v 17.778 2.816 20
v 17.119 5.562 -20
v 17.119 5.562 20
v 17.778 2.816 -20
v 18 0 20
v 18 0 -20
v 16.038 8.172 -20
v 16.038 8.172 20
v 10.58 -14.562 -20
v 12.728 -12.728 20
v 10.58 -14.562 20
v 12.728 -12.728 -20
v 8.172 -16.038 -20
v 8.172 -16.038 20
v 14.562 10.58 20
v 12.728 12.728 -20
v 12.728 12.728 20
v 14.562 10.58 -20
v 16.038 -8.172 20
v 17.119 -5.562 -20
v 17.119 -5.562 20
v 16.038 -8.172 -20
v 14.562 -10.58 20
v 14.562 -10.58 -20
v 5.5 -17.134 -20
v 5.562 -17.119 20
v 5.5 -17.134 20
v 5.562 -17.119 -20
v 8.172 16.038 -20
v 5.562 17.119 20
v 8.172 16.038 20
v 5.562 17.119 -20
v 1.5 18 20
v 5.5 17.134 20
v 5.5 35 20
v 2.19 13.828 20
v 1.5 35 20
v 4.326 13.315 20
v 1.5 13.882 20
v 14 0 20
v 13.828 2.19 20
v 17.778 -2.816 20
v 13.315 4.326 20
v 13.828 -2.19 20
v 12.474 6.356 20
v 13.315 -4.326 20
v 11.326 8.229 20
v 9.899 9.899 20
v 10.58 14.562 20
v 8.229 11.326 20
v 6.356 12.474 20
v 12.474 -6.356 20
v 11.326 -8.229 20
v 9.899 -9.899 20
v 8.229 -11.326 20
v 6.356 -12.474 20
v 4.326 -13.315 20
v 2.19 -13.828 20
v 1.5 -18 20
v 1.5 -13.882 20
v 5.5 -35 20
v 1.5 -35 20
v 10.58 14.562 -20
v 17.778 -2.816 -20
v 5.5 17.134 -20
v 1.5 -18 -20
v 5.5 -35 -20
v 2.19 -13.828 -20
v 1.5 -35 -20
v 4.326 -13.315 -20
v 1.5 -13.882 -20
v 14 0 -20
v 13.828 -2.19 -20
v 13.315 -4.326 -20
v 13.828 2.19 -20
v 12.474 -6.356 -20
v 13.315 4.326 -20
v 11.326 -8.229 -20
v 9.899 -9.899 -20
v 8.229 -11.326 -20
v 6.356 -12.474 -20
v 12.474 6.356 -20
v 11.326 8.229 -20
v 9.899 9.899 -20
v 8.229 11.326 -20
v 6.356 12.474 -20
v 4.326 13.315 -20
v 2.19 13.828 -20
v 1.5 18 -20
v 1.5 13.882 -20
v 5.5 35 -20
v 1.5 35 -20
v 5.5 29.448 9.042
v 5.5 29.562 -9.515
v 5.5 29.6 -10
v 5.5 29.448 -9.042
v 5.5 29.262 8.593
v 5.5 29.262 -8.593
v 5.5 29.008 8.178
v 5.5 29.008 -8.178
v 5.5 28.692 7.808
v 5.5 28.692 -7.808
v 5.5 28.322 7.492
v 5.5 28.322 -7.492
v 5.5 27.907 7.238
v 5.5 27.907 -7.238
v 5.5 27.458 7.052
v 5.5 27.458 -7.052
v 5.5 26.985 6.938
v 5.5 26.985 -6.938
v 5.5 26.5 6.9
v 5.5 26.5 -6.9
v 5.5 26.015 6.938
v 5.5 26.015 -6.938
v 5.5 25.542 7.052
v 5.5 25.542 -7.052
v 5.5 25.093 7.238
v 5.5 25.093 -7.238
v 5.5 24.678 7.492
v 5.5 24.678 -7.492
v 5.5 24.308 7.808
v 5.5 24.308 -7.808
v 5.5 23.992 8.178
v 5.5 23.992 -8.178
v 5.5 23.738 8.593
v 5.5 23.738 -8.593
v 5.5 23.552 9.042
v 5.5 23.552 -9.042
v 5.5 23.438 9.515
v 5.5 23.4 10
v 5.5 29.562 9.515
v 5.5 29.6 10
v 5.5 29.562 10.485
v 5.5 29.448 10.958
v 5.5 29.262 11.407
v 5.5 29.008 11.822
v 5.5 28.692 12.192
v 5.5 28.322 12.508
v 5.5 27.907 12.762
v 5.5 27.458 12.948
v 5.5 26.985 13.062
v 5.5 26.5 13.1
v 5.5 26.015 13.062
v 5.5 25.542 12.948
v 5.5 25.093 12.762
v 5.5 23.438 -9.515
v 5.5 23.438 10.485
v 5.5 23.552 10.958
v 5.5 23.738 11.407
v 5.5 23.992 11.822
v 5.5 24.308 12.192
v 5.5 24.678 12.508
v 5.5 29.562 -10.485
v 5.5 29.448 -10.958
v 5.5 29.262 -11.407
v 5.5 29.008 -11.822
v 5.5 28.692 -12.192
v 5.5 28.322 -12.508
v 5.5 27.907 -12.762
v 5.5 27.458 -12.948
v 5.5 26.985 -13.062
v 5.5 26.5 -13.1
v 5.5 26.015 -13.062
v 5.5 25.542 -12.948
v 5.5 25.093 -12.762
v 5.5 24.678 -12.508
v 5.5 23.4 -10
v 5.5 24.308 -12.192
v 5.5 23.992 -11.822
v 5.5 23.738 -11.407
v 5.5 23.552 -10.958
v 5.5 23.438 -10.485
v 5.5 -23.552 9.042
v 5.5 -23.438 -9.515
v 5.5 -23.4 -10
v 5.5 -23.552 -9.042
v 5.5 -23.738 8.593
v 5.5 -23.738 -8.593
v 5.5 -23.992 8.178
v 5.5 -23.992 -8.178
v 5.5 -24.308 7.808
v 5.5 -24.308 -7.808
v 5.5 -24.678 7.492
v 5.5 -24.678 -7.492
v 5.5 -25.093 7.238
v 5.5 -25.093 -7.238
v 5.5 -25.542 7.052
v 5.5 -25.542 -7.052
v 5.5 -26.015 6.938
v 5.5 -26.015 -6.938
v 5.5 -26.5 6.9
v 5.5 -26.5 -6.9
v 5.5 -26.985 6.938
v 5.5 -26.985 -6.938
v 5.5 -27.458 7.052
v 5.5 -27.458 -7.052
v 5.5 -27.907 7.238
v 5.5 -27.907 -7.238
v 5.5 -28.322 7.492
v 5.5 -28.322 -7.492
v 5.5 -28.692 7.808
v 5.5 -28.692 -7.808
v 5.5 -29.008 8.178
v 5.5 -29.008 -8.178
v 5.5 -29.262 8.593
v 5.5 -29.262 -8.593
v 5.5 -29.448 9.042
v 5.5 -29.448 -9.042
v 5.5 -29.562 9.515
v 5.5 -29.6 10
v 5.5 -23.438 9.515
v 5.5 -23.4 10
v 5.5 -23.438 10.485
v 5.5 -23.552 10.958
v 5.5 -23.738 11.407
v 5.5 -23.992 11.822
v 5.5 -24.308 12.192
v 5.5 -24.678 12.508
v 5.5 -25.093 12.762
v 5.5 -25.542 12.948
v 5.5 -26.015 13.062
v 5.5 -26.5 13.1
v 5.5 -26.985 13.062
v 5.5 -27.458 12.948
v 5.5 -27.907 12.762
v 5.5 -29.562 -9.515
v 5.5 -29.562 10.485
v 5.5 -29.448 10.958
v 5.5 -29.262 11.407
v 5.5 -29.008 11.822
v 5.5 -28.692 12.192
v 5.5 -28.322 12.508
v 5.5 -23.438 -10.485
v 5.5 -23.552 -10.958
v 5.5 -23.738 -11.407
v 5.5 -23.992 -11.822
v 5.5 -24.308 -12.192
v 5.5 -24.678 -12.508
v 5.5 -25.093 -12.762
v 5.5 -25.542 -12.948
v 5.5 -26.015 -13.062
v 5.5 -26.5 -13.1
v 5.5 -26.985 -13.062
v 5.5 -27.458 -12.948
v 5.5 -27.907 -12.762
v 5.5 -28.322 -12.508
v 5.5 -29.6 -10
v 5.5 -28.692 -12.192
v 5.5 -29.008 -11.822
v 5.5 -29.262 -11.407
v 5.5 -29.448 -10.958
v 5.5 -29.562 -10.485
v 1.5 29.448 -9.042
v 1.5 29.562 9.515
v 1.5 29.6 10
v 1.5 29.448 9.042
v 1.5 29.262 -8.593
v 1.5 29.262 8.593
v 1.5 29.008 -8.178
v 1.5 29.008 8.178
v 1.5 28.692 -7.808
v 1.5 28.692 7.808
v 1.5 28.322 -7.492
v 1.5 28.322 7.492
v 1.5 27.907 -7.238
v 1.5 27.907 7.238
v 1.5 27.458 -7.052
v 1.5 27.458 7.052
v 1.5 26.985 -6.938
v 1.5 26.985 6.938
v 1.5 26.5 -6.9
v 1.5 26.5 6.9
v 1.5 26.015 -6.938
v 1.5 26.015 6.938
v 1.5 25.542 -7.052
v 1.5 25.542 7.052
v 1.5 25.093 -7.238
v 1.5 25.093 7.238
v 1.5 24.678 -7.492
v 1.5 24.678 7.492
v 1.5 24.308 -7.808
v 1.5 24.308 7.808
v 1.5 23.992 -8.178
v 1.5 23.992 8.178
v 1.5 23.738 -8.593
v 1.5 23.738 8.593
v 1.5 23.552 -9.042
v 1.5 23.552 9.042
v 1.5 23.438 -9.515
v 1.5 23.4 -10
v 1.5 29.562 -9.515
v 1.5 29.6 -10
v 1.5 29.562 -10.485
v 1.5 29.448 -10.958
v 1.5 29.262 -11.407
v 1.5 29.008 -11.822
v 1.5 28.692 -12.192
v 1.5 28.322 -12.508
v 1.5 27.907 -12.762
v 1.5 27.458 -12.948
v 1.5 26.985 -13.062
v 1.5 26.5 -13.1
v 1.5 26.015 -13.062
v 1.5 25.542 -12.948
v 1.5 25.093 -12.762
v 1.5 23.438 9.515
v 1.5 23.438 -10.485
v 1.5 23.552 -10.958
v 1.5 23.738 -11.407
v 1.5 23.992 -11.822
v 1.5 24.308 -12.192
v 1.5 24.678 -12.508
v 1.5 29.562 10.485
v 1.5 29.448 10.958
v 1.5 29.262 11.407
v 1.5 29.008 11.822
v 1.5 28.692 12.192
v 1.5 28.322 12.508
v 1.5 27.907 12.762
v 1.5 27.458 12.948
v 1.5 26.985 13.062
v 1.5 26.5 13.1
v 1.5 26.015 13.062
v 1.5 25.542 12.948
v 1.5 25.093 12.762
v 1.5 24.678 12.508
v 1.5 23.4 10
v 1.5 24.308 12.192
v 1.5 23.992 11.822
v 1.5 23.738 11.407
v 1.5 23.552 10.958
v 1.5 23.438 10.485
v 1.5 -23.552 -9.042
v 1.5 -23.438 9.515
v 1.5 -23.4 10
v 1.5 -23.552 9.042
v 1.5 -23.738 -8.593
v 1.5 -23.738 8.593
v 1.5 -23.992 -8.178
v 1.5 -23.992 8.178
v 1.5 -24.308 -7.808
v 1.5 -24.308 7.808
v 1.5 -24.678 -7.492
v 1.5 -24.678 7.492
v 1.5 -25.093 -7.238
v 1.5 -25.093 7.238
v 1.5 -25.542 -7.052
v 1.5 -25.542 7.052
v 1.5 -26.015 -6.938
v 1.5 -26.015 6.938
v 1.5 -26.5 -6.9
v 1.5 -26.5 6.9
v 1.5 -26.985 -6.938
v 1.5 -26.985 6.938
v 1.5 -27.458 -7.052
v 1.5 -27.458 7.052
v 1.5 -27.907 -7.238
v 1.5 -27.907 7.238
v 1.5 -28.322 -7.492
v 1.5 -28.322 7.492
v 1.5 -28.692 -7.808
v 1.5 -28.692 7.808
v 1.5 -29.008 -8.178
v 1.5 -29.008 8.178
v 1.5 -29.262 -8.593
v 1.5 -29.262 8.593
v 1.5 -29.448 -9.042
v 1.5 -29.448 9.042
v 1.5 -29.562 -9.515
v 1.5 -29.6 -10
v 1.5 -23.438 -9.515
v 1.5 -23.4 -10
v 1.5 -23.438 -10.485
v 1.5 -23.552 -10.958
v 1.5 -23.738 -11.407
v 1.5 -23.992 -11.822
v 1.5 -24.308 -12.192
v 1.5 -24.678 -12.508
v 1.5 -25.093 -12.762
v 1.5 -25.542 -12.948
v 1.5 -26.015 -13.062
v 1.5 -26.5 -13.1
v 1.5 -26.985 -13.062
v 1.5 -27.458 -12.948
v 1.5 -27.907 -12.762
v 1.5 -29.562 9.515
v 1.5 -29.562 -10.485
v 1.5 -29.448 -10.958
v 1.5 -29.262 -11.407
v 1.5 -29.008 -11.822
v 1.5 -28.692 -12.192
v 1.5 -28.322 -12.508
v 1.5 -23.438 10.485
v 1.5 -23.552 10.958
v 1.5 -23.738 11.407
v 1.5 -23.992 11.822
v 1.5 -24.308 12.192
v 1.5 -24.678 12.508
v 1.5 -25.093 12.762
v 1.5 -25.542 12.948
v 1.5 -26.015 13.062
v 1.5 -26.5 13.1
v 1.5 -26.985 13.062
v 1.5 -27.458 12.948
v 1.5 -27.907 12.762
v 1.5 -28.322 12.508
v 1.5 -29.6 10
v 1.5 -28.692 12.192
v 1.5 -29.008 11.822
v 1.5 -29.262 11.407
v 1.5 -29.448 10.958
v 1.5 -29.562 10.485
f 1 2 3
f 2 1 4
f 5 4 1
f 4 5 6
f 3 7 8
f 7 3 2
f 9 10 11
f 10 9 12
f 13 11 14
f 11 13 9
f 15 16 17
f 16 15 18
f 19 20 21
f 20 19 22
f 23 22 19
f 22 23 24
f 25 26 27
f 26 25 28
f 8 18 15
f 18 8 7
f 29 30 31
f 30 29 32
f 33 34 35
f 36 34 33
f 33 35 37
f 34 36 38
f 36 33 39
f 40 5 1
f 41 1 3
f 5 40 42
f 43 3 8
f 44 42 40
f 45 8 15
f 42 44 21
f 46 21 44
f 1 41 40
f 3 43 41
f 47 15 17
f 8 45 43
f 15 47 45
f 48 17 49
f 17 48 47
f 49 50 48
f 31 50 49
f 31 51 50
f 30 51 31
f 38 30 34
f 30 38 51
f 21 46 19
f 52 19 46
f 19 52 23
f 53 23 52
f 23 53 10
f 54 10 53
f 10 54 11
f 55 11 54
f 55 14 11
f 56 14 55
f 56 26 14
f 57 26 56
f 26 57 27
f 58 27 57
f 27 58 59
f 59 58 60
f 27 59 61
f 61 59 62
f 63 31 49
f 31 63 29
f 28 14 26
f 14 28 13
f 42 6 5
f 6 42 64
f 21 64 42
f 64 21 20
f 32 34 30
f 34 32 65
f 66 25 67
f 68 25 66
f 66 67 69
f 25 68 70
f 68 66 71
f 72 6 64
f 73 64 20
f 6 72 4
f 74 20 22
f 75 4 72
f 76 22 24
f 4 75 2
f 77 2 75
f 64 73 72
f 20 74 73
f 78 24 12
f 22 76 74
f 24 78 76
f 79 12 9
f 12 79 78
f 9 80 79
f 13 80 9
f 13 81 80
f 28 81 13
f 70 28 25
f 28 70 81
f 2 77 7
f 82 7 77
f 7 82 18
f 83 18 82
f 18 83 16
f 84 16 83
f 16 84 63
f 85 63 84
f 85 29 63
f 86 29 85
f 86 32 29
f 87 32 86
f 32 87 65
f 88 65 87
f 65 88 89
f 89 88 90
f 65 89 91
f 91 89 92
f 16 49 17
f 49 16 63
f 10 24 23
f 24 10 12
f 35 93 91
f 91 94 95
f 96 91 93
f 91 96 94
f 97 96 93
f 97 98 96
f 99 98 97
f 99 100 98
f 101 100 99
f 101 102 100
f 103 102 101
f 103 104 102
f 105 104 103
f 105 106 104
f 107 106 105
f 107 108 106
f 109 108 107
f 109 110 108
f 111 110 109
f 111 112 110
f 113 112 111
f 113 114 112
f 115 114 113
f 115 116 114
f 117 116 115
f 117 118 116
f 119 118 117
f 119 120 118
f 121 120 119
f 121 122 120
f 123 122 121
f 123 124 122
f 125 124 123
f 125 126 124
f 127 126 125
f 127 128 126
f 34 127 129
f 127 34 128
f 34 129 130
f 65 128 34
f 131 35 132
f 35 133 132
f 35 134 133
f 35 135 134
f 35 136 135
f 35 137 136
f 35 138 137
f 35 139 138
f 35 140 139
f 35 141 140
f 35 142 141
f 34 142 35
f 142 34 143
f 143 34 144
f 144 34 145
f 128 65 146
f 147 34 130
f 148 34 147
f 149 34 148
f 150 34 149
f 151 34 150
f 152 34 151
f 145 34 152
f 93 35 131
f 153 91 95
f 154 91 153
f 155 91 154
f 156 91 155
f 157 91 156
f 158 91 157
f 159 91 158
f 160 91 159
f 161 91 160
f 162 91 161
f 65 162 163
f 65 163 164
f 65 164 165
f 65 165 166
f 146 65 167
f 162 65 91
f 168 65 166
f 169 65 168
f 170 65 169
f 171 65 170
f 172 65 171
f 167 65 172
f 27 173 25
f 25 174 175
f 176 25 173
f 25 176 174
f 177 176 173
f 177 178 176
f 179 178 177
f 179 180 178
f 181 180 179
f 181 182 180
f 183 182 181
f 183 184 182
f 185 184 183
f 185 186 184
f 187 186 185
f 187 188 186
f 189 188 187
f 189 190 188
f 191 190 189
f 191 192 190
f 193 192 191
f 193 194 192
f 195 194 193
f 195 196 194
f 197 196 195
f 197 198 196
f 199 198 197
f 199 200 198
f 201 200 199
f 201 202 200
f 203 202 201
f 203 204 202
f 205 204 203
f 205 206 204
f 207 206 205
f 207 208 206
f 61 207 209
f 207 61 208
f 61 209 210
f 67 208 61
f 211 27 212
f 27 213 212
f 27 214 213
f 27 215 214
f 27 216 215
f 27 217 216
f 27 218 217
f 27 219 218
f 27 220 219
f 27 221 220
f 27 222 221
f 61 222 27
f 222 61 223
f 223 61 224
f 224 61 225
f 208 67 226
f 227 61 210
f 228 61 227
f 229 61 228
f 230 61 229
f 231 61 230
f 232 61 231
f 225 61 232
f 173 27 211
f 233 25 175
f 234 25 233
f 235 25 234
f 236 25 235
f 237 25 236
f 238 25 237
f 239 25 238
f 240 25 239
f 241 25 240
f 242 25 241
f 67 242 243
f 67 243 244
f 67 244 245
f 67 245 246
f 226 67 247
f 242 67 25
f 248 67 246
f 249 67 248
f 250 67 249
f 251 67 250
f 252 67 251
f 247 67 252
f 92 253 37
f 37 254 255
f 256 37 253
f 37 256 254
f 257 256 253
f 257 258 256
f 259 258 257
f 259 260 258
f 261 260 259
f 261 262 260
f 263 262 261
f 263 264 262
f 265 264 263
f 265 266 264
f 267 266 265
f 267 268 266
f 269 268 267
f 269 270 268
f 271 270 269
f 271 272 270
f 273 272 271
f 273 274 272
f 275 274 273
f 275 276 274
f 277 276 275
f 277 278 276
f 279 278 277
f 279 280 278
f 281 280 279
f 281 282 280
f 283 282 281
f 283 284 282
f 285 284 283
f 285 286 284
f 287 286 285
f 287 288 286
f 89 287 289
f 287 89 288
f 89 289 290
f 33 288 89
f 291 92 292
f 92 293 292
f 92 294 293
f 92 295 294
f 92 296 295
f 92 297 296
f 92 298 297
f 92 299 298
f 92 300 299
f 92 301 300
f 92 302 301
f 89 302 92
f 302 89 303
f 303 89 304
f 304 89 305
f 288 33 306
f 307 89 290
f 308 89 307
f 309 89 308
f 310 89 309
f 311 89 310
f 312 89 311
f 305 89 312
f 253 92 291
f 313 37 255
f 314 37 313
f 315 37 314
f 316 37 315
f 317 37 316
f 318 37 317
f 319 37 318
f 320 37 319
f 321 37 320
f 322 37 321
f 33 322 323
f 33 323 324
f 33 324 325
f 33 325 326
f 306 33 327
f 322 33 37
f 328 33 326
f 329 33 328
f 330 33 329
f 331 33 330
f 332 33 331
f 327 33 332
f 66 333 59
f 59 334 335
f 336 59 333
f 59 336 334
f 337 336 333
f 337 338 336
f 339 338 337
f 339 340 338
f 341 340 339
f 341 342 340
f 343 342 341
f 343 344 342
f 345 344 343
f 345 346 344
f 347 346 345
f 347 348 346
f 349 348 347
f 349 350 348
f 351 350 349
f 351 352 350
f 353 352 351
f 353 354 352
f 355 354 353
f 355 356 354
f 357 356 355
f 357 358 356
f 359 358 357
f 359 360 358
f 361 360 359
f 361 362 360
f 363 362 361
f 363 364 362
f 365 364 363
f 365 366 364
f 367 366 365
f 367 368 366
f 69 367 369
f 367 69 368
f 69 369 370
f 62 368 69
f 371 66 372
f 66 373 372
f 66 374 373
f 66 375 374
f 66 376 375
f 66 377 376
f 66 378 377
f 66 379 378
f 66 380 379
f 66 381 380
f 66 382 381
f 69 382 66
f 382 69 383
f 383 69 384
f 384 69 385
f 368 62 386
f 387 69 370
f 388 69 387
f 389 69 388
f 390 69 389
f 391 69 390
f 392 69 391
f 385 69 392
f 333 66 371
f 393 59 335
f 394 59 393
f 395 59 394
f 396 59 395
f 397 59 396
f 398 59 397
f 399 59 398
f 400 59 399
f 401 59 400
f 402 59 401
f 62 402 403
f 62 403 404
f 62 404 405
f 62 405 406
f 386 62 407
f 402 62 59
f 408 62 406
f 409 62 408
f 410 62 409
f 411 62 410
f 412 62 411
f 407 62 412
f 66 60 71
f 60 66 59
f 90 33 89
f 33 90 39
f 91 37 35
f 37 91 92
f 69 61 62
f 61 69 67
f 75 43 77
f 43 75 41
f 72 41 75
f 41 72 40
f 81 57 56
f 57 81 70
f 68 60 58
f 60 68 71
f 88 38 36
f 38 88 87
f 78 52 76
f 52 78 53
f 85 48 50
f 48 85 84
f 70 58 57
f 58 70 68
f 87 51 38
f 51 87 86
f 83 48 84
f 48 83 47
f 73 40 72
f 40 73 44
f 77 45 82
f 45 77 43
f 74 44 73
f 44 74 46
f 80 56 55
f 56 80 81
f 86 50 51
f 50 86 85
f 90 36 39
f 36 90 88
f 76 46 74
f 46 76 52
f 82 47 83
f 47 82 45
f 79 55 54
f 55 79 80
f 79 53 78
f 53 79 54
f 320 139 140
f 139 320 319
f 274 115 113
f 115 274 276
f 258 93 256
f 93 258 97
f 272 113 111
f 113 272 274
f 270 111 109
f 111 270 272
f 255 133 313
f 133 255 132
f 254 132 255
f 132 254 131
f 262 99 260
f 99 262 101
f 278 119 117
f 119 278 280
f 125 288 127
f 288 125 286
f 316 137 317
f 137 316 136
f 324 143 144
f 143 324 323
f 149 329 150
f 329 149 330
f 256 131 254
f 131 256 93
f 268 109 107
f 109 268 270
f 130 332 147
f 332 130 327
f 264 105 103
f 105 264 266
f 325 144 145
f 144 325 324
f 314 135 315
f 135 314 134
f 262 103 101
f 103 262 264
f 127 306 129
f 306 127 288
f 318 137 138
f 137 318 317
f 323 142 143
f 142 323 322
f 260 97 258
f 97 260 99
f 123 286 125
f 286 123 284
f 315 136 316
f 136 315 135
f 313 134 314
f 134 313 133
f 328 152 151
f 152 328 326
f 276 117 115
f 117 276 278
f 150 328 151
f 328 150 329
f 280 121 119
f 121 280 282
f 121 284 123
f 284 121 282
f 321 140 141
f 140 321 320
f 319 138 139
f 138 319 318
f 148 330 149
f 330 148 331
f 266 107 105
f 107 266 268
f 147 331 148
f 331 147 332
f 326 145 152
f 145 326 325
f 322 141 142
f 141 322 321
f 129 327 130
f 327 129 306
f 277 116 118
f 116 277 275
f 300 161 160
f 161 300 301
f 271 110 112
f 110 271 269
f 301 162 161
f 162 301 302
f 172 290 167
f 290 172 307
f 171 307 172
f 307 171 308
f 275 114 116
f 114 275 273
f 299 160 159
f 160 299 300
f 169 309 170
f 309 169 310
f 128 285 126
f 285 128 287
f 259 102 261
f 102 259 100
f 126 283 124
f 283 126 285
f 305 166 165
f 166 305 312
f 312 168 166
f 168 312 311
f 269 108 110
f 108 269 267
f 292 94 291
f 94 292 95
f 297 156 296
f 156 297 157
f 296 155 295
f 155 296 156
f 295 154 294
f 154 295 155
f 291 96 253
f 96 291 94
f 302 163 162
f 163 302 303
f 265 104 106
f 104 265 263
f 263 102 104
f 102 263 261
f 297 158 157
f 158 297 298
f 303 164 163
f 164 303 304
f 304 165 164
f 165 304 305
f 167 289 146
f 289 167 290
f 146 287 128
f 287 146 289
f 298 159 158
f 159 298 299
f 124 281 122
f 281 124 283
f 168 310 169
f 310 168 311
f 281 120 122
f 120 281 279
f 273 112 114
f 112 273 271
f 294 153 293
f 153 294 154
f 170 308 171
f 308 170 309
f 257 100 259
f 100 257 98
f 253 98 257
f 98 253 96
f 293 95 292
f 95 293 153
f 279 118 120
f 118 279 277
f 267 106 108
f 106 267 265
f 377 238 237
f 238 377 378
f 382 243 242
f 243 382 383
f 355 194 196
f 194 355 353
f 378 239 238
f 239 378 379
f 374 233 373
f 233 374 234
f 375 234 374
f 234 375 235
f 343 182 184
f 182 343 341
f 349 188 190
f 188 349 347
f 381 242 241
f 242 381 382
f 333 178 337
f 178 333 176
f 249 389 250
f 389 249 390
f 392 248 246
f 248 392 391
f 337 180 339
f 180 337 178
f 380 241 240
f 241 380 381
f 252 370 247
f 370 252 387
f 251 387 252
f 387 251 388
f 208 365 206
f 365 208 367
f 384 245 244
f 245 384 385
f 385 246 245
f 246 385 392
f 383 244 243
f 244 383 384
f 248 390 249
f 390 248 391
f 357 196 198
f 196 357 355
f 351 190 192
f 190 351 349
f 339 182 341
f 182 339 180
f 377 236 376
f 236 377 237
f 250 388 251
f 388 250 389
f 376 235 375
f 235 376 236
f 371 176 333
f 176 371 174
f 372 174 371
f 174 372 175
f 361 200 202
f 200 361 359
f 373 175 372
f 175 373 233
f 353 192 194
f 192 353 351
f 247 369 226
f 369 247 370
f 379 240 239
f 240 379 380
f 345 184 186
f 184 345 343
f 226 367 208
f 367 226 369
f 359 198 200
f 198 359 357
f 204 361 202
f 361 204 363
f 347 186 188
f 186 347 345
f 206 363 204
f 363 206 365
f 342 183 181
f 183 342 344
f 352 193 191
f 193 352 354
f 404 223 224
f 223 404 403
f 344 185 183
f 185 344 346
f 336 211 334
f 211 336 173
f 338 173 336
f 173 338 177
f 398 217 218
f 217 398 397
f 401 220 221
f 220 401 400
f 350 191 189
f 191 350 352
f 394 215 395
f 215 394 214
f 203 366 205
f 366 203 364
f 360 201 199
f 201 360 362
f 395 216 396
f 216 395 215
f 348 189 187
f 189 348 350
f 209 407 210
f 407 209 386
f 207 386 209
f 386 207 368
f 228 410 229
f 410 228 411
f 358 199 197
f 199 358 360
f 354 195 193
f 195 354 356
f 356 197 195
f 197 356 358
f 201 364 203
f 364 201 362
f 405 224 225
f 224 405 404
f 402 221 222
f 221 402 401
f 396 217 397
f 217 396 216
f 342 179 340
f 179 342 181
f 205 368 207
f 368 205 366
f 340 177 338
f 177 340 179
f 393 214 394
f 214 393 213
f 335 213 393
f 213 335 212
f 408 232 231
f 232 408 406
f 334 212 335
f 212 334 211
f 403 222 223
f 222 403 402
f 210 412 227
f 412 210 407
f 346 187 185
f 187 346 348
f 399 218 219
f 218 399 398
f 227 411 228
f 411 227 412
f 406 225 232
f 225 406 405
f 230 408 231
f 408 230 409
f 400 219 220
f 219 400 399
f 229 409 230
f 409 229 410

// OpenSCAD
// file: ../configuration.scad
$fn=40; // model faces resolution.

//OBECNE PARAMETRY 
//----------------------------------------------------------------
//----------------------------------------------------------------


//AWSCREEN01A_D03 -stredni díl
D03_vyska_zavitu=5;
D03_tolerance_zavitu=0.75; //tolerance s poloměru
D03_material_za_zavitem=2;
D03_polomer_zavitu=22.5;
D03_polomer_stitu=37.5;
D03_tloustka_materialu=1.4;
D03_vyska_stitu=15;
D03_pocet_vyztuh=3;
screen_bevel = 20;
PI=3.141592;

//AWSCREEN01A_D04
D04_sila_materialu_na_konektor=3;
D04_konenektor_x=12.3;
D04_konenektor_y=19;

//AWSCREEN01A_D05 //uchyt velky
D01_material_pod_zavitem=5;
D01_material_za_zavitem=5;
D01_material_pred_zavitem=2;
D01_delka_tyce=40;
D01_sirka_tyce=10;
S01_vyska_komponentu_na_lozisko=D03_vyska_zavitu;
S01_prumer_zavitu=2*D03_polomer_zavitu;


//AWSCREEN01A_D06 //uchyt na sloup
D02_sila_materialu=4;
D02_vyska_uchytky=40;
D02_prumer_obruby=28;
D02_delka_celeho_uchytu=70;
D02_dotahova_vzdalenost=1.5;
D02_prumer_uchytneho_sroubu=6.2;
// main file
$fn=40; // model faces resolution.
include <../configuration.scad>

AWSCREEN01A_D06(D02_sila_materialu,D02_vyska_uchytky,D02_prumer_obruby,D02_delka_celeho_uchytu,D02_dotahova_vzdalenost,D02_prumer_uchytneho_sroubu);

module AWSCREEN01A_D06(D02_sila_materialu,D02_vyska_uchytky,D02_prumer_obruby,D02_delka_celeho_uchytu,D02_dotahova_vzdalenost,D02_prumer_uchytneho_sroubu){
	
		difference(){
			union(){
                
                //základní válec
                    cylinder(h=D02_vyska_uchytky,r=(D02_prumer_obruby+2*D02_sila_materialu)/2,center=true);
				//úchytové plošky		
					translate([D02_dotahova_vzdalenost+D02_sila_materialu/2,0,0]){cube([D02_sila_materialu,D02_delka_celeho_uchytu,D02_vyska_uchytky],center=true);}
					
				}
                //válec na odečet
           cylinder(h=D02_vyska_uchytky+0.01,r=D02_prumer_obruby/2,center=true);     
			
            
            //kvádr na odecet
			translate([D02_dotahova_vzdalenost-(D02_prumer_obruby+2*D02_sila_materialu)/2,0,0]){cube([D02_prumer_obruby+2*D02_sila_materialu,D02_prumer_obruby+2*D02_sila_materialu,D02_vyska_uchytky+0.01],center=true);}
		
	//otvory na sroub
		translate([D02_dotahova_vzdalenost,(D02_delka_celeho_uchytu/2-D02_prumer_obruby/2-D02_sila_materialu)/2+D02_prumer_obruby/2+D02_sila_materialu,D02_vyska_uchytky/4]){rotate([0,90,0]){cylinder(h=D02_sila_materialu+0.01,r=D02_prumer_uchytneho_sroubu/2);}}
        
        		translate([D02_dotahova_vzdalenost,(D02_delka_celeho_uchytu/2-D02_prumer_obruby/2-D02_sila_materialu)/2+D02_prumer_obruby/2+D02_sila_materialu,-D02_vyska_uchytky/4]){rotate([0,90,0]){cylinder(h=D02_sila_materialu+0.01,r=D02_prumer_uchytneho_sroubu/2);}}
        
	translate([D02_dotahova_vzdalenost,-((D02_delka_celeho_uchytu/2-D02_prumer_obruby/2-D02_sila_materialu)/2+D02_prumer_obruby/2+D02_sila_materialu),-D02_vyska_uchytky/4]){rotate([0,90,0]){cylinder(h=D02_sila_materialu+0.01,r=D02_prumer_uchytneho_sroubu/2);}}

translate([D02_dotahova_vzdalenost,-((D02_delka_celeho_uchytu/2-D02_prumer_obruby/2-D02_sila_materialu)/2+D02_prumer_obruby/2+D02_sila_materialu),D02_vyska_uchytky/4]){rotate([0,90,0]){cylinder(h=D02_sila_materialu+0.01,r=D02_prumer_uchytneho_sroubu/2);}}	
		
	
}
}
